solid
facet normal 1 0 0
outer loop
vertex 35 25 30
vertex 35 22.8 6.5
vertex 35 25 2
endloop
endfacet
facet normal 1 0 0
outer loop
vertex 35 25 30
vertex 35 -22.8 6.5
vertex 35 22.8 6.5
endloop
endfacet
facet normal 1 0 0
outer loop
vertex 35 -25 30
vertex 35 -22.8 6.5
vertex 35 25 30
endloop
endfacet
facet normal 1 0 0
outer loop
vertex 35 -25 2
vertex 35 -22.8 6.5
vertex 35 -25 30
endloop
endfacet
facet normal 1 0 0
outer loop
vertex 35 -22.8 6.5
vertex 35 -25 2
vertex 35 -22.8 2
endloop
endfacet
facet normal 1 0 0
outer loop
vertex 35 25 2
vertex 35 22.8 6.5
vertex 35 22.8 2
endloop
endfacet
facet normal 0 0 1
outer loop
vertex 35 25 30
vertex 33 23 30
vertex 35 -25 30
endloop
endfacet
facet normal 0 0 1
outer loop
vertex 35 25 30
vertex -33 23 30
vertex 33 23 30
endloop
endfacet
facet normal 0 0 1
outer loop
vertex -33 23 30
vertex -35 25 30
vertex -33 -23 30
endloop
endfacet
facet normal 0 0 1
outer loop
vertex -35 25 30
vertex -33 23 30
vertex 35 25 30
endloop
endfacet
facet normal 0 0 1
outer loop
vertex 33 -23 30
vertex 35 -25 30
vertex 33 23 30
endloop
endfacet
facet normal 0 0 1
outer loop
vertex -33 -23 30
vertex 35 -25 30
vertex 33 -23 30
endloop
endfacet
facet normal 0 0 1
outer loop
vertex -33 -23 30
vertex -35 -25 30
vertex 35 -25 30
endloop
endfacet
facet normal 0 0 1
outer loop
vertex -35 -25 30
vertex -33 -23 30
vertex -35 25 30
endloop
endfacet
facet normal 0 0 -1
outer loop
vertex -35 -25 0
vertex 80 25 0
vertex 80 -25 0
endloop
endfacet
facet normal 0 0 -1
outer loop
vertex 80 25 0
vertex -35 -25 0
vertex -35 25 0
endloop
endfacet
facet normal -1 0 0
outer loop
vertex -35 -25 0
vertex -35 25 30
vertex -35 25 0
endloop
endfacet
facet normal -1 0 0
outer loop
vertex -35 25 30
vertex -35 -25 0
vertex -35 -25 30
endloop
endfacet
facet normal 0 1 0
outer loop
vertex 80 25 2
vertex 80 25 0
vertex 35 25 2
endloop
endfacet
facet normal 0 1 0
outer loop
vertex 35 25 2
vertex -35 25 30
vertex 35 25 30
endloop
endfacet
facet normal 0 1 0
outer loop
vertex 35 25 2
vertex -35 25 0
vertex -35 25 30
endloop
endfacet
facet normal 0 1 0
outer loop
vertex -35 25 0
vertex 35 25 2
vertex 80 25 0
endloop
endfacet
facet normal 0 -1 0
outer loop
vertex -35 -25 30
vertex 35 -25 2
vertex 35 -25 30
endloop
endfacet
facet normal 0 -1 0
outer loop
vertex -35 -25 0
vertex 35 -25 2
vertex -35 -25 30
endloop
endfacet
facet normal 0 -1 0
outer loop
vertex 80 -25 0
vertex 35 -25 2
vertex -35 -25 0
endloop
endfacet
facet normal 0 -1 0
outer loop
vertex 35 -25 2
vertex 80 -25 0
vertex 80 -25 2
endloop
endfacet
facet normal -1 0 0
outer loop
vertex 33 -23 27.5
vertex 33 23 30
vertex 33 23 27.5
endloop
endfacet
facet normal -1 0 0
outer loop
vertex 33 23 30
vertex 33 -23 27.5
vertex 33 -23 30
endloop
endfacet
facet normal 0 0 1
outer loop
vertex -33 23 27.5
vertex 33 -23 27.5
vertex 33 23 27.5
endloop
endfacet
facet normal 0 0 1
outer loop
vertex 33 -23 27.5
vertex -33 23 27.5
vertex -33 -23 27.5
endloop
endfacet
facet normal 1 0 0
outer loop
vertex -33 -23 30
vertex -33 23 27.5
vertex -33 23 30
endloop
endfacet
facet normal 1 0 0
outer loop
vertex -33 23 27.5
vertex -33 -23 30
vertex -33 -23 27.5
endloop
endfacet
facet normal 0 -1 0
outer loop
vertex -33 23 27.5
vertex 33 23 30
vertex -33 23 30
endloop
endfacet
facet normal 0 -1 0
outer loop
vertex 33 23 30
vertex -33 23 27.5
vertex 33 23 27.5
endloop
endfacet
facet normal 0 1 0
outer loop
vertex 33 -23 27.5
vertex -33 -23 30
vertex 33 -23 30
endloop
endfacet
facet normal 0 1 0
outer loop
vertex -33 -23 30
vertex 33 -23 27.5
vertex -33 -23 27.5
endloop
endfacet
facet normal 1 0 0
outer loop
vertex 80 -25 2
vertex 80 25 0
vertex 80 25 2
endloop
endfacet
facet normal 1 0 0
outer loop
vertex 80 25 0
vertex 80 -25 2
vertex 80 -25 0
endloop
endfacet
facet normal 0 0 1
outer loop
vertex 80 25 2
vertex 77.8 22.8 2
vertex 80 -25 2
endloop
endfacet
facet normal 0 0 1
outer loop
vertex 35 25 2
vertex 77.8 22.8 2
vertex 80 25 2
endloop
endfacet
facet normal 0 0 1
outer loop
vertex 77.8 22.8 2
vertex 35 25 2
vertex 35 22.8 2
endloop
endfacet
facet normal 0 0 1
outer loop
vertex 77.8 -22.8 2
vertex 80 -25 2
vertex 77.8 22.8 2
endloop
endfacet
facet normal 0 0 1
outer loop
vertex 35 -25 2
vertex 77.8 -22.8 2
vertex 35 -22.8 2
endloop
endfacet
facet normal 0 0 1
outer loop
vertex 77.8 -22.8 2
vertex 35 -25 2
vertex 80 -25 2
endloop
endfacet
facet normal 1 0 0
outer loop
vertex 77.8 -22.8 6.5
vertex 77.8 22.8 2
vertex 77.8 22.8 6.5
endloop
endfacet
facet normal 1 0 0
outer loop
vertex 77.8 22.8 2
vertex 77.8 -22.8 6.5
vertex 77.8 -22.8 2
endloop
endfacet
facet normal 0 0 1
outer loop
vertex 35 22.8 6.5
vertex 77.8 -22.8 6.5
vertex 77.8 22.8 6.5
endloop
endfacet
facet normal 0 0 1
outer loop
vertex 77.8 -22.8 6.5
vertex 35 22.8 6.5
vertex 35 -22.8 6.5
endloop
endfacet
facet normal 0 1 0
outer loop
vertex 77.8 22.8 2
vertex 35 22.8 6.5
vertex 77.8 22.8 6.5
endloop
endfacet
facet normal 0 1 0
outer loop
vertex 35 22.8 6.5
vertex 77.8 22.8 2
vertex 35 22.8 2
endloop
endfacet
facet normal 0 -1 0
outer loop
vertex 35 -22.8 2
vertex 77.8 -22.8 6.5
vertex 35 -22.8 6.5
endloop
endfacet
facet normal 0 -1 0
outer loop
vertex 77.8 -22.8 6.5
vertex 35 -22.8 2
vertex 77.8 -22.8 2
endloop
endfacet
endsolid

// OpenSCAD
// Two-part enclosure for a small electronics board (e.g. Arduino-based temperature logger)
// Print orientation: both parts lie on the bed (z = 0), side by side, with a 10 mm gap.

// ---------------- Parameters ----------------
box_x      = 70;    // box outer size in X
box_y      = 50;    // box outer size in Y
box_z      = 30;    // box outer size in Z
wall       = 2;     // box wall thickness
floor      = 2;     // box floor thickness

lip_t      = 1.5;   // lip wall thickness
lip_h      = 4;     // lip height (from plate top)
lip_x      = 65.6;  // lip outer size in X
lip_y      = 45.6;  // lip outer size in Y
clearance  = 0.2;   // clearance between lip and box opening on each side

eps        = 0.5;   // overcut for clean boolean differences
$fn        = 64;

// Derived
box_i_x = box_x - 2 * wall;   // box opening in X
box_i_y = box_y - 2 * wall;   // box opening in Y
plate_t = 2;                  // plate thickness under the lip

// ---------------- Modules ----------------
module box() {
    difference() {
        translate([-box_x / 2, -box_y / 2, 0])
            cube([box_x, box_y, box_z]);
        // open top: cut a channel through the top wall and floor
        translate([-box_i_x / 2, -box_i_y / 2, box_z - wall - eps])
            cube([box_i_x, box_i_y, wall + eps + floor]);
    }
}

module lid() {
    union() {
        // base plate
        translate([-box_x / 2, -box_y / 2, 0])
            cube([box_x, box_y, plate_t]);
        // centred lip (overlaps the plate by eps so the union is one solid)
        translate([-lip_x / 2, -lip_y / 2, plate_t])
            cube([lip_x, lip_y, lip_h + eps]);
    }
}

// ---------------- Assembly ----------------
// Print together: box on the -X side, lid on the +X side, 10 mm gap
union() {
    box();
    translate([box_x / 2 + 10, 0, 0])
        lid();
}
